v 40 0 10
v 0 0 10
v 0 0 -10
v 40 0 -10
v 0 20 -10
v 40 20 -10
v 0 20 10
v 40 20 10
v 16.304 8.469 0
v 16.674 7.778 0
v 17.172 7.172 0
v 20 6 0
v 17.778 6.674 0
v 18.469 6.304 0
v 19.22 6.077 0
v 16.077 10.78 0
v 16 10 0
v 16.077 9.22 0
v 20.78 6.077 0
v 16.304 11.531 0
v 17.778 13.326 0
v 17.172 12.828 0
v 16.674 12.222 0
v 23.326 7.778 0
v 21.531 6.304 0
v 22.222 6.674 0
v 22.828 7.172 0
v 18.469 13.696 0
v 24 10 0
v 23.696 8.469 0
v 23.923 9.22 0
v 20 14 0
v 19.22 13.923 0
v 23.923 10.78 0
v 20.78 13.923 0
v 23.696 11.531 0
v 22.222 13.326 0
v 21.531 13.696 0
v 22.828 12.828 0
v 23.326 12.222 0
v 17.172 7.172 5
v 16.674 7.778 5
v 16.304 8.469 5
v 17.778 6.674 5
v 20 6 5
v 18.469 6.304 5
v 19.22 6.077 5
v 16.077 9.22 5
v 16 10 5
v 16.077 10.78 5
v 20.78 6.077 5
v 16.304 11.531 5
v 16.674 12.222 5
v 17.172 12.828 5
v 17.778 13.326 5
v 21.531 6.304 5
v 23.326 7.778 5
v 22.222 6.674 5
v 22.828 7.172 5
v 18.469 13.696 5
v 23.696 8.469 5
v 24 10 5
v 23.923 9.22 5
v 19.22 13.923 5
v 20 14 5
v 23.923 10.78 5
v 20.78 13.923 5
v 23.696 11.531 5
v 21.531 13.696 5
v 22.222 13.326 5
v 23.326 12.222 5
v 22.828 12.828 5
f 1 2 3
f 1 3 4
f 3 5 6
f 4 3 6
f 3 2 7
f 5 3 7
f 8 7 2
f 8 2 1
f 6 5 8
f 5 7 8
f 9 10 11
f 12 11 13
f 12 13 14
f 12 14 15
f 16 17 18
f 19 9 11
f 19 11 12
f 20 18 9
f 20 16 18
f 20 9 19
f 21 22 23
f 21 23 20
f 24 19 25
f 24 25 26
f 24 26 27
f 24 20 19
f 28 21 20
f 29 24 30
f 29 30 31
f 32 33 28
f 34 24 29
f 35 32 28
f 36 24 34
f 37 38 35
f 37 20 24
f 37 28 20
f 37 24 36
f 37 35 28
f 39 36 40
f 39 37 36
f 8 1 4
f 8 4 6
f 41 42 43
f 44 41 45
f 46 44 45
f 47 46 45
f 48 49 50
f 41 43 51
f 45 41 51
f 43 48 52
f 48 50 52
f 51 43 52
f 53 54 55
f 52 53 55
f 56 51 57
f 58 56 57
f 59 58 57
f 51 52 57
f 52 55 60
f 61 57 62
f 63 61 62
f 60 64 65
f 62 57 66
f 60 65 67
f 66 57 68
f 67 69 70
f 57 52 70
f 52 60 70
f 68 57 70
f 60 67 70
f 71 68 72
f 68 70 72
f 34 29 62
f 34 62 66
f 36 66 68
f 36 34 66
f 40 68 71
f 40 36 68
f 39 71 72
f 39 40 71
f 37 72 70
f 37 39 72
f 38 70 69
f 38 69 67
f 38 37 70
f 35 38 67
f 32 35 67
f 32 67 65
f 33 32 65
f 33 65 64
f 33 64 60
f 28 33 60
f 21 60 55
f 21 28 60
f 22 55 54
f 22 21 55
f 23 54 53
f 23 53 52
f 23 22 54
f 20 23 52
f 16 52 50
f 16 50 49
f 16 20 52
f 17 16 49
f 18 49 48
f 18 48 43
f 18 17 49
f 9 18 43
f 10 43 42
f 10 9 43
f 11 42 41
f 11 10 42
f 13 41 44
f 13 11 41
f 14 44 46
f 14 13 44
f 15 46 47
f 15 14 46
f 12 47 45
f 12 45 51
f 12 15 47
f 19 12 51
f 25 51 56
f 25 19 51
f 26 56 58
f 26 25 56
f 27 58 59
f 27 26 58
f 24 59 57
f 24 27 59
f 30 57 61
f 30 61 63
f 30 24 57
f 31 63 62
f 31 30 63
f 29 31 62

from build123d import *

# Parameters (mm, degrees)
SKETCH1_W           = 40
SKETCH1_H           = 20
BOSS_EXTRUDE1_DEPTH = 10
SKETCH2_R           = 4
CUT_EXTRUDE1_DEPTH  = 5


with BuildPart() as part:
    # Sketch1 → Boss-Extrude1 (new, symmetric)
    with BuildSketch(Plane.XY):
        with Locations((20, 10)):
            Rectangle(SKETCH1_W, SKETCH1_H)
    extrude(amount=BOSS_EXTRUDE1_DEPTH, both=True)

    # Sketch2 → Cut-Extrude1 (cut)
    with BuildSketch(Plane.XY):
        with Locations((20, 10)):
            Circle(SKETCH2_R)
    extrude(amount=CUT_EXTRUDE1_DEPTH, mode=Mode.SUBTRACT)


solid = part.part
